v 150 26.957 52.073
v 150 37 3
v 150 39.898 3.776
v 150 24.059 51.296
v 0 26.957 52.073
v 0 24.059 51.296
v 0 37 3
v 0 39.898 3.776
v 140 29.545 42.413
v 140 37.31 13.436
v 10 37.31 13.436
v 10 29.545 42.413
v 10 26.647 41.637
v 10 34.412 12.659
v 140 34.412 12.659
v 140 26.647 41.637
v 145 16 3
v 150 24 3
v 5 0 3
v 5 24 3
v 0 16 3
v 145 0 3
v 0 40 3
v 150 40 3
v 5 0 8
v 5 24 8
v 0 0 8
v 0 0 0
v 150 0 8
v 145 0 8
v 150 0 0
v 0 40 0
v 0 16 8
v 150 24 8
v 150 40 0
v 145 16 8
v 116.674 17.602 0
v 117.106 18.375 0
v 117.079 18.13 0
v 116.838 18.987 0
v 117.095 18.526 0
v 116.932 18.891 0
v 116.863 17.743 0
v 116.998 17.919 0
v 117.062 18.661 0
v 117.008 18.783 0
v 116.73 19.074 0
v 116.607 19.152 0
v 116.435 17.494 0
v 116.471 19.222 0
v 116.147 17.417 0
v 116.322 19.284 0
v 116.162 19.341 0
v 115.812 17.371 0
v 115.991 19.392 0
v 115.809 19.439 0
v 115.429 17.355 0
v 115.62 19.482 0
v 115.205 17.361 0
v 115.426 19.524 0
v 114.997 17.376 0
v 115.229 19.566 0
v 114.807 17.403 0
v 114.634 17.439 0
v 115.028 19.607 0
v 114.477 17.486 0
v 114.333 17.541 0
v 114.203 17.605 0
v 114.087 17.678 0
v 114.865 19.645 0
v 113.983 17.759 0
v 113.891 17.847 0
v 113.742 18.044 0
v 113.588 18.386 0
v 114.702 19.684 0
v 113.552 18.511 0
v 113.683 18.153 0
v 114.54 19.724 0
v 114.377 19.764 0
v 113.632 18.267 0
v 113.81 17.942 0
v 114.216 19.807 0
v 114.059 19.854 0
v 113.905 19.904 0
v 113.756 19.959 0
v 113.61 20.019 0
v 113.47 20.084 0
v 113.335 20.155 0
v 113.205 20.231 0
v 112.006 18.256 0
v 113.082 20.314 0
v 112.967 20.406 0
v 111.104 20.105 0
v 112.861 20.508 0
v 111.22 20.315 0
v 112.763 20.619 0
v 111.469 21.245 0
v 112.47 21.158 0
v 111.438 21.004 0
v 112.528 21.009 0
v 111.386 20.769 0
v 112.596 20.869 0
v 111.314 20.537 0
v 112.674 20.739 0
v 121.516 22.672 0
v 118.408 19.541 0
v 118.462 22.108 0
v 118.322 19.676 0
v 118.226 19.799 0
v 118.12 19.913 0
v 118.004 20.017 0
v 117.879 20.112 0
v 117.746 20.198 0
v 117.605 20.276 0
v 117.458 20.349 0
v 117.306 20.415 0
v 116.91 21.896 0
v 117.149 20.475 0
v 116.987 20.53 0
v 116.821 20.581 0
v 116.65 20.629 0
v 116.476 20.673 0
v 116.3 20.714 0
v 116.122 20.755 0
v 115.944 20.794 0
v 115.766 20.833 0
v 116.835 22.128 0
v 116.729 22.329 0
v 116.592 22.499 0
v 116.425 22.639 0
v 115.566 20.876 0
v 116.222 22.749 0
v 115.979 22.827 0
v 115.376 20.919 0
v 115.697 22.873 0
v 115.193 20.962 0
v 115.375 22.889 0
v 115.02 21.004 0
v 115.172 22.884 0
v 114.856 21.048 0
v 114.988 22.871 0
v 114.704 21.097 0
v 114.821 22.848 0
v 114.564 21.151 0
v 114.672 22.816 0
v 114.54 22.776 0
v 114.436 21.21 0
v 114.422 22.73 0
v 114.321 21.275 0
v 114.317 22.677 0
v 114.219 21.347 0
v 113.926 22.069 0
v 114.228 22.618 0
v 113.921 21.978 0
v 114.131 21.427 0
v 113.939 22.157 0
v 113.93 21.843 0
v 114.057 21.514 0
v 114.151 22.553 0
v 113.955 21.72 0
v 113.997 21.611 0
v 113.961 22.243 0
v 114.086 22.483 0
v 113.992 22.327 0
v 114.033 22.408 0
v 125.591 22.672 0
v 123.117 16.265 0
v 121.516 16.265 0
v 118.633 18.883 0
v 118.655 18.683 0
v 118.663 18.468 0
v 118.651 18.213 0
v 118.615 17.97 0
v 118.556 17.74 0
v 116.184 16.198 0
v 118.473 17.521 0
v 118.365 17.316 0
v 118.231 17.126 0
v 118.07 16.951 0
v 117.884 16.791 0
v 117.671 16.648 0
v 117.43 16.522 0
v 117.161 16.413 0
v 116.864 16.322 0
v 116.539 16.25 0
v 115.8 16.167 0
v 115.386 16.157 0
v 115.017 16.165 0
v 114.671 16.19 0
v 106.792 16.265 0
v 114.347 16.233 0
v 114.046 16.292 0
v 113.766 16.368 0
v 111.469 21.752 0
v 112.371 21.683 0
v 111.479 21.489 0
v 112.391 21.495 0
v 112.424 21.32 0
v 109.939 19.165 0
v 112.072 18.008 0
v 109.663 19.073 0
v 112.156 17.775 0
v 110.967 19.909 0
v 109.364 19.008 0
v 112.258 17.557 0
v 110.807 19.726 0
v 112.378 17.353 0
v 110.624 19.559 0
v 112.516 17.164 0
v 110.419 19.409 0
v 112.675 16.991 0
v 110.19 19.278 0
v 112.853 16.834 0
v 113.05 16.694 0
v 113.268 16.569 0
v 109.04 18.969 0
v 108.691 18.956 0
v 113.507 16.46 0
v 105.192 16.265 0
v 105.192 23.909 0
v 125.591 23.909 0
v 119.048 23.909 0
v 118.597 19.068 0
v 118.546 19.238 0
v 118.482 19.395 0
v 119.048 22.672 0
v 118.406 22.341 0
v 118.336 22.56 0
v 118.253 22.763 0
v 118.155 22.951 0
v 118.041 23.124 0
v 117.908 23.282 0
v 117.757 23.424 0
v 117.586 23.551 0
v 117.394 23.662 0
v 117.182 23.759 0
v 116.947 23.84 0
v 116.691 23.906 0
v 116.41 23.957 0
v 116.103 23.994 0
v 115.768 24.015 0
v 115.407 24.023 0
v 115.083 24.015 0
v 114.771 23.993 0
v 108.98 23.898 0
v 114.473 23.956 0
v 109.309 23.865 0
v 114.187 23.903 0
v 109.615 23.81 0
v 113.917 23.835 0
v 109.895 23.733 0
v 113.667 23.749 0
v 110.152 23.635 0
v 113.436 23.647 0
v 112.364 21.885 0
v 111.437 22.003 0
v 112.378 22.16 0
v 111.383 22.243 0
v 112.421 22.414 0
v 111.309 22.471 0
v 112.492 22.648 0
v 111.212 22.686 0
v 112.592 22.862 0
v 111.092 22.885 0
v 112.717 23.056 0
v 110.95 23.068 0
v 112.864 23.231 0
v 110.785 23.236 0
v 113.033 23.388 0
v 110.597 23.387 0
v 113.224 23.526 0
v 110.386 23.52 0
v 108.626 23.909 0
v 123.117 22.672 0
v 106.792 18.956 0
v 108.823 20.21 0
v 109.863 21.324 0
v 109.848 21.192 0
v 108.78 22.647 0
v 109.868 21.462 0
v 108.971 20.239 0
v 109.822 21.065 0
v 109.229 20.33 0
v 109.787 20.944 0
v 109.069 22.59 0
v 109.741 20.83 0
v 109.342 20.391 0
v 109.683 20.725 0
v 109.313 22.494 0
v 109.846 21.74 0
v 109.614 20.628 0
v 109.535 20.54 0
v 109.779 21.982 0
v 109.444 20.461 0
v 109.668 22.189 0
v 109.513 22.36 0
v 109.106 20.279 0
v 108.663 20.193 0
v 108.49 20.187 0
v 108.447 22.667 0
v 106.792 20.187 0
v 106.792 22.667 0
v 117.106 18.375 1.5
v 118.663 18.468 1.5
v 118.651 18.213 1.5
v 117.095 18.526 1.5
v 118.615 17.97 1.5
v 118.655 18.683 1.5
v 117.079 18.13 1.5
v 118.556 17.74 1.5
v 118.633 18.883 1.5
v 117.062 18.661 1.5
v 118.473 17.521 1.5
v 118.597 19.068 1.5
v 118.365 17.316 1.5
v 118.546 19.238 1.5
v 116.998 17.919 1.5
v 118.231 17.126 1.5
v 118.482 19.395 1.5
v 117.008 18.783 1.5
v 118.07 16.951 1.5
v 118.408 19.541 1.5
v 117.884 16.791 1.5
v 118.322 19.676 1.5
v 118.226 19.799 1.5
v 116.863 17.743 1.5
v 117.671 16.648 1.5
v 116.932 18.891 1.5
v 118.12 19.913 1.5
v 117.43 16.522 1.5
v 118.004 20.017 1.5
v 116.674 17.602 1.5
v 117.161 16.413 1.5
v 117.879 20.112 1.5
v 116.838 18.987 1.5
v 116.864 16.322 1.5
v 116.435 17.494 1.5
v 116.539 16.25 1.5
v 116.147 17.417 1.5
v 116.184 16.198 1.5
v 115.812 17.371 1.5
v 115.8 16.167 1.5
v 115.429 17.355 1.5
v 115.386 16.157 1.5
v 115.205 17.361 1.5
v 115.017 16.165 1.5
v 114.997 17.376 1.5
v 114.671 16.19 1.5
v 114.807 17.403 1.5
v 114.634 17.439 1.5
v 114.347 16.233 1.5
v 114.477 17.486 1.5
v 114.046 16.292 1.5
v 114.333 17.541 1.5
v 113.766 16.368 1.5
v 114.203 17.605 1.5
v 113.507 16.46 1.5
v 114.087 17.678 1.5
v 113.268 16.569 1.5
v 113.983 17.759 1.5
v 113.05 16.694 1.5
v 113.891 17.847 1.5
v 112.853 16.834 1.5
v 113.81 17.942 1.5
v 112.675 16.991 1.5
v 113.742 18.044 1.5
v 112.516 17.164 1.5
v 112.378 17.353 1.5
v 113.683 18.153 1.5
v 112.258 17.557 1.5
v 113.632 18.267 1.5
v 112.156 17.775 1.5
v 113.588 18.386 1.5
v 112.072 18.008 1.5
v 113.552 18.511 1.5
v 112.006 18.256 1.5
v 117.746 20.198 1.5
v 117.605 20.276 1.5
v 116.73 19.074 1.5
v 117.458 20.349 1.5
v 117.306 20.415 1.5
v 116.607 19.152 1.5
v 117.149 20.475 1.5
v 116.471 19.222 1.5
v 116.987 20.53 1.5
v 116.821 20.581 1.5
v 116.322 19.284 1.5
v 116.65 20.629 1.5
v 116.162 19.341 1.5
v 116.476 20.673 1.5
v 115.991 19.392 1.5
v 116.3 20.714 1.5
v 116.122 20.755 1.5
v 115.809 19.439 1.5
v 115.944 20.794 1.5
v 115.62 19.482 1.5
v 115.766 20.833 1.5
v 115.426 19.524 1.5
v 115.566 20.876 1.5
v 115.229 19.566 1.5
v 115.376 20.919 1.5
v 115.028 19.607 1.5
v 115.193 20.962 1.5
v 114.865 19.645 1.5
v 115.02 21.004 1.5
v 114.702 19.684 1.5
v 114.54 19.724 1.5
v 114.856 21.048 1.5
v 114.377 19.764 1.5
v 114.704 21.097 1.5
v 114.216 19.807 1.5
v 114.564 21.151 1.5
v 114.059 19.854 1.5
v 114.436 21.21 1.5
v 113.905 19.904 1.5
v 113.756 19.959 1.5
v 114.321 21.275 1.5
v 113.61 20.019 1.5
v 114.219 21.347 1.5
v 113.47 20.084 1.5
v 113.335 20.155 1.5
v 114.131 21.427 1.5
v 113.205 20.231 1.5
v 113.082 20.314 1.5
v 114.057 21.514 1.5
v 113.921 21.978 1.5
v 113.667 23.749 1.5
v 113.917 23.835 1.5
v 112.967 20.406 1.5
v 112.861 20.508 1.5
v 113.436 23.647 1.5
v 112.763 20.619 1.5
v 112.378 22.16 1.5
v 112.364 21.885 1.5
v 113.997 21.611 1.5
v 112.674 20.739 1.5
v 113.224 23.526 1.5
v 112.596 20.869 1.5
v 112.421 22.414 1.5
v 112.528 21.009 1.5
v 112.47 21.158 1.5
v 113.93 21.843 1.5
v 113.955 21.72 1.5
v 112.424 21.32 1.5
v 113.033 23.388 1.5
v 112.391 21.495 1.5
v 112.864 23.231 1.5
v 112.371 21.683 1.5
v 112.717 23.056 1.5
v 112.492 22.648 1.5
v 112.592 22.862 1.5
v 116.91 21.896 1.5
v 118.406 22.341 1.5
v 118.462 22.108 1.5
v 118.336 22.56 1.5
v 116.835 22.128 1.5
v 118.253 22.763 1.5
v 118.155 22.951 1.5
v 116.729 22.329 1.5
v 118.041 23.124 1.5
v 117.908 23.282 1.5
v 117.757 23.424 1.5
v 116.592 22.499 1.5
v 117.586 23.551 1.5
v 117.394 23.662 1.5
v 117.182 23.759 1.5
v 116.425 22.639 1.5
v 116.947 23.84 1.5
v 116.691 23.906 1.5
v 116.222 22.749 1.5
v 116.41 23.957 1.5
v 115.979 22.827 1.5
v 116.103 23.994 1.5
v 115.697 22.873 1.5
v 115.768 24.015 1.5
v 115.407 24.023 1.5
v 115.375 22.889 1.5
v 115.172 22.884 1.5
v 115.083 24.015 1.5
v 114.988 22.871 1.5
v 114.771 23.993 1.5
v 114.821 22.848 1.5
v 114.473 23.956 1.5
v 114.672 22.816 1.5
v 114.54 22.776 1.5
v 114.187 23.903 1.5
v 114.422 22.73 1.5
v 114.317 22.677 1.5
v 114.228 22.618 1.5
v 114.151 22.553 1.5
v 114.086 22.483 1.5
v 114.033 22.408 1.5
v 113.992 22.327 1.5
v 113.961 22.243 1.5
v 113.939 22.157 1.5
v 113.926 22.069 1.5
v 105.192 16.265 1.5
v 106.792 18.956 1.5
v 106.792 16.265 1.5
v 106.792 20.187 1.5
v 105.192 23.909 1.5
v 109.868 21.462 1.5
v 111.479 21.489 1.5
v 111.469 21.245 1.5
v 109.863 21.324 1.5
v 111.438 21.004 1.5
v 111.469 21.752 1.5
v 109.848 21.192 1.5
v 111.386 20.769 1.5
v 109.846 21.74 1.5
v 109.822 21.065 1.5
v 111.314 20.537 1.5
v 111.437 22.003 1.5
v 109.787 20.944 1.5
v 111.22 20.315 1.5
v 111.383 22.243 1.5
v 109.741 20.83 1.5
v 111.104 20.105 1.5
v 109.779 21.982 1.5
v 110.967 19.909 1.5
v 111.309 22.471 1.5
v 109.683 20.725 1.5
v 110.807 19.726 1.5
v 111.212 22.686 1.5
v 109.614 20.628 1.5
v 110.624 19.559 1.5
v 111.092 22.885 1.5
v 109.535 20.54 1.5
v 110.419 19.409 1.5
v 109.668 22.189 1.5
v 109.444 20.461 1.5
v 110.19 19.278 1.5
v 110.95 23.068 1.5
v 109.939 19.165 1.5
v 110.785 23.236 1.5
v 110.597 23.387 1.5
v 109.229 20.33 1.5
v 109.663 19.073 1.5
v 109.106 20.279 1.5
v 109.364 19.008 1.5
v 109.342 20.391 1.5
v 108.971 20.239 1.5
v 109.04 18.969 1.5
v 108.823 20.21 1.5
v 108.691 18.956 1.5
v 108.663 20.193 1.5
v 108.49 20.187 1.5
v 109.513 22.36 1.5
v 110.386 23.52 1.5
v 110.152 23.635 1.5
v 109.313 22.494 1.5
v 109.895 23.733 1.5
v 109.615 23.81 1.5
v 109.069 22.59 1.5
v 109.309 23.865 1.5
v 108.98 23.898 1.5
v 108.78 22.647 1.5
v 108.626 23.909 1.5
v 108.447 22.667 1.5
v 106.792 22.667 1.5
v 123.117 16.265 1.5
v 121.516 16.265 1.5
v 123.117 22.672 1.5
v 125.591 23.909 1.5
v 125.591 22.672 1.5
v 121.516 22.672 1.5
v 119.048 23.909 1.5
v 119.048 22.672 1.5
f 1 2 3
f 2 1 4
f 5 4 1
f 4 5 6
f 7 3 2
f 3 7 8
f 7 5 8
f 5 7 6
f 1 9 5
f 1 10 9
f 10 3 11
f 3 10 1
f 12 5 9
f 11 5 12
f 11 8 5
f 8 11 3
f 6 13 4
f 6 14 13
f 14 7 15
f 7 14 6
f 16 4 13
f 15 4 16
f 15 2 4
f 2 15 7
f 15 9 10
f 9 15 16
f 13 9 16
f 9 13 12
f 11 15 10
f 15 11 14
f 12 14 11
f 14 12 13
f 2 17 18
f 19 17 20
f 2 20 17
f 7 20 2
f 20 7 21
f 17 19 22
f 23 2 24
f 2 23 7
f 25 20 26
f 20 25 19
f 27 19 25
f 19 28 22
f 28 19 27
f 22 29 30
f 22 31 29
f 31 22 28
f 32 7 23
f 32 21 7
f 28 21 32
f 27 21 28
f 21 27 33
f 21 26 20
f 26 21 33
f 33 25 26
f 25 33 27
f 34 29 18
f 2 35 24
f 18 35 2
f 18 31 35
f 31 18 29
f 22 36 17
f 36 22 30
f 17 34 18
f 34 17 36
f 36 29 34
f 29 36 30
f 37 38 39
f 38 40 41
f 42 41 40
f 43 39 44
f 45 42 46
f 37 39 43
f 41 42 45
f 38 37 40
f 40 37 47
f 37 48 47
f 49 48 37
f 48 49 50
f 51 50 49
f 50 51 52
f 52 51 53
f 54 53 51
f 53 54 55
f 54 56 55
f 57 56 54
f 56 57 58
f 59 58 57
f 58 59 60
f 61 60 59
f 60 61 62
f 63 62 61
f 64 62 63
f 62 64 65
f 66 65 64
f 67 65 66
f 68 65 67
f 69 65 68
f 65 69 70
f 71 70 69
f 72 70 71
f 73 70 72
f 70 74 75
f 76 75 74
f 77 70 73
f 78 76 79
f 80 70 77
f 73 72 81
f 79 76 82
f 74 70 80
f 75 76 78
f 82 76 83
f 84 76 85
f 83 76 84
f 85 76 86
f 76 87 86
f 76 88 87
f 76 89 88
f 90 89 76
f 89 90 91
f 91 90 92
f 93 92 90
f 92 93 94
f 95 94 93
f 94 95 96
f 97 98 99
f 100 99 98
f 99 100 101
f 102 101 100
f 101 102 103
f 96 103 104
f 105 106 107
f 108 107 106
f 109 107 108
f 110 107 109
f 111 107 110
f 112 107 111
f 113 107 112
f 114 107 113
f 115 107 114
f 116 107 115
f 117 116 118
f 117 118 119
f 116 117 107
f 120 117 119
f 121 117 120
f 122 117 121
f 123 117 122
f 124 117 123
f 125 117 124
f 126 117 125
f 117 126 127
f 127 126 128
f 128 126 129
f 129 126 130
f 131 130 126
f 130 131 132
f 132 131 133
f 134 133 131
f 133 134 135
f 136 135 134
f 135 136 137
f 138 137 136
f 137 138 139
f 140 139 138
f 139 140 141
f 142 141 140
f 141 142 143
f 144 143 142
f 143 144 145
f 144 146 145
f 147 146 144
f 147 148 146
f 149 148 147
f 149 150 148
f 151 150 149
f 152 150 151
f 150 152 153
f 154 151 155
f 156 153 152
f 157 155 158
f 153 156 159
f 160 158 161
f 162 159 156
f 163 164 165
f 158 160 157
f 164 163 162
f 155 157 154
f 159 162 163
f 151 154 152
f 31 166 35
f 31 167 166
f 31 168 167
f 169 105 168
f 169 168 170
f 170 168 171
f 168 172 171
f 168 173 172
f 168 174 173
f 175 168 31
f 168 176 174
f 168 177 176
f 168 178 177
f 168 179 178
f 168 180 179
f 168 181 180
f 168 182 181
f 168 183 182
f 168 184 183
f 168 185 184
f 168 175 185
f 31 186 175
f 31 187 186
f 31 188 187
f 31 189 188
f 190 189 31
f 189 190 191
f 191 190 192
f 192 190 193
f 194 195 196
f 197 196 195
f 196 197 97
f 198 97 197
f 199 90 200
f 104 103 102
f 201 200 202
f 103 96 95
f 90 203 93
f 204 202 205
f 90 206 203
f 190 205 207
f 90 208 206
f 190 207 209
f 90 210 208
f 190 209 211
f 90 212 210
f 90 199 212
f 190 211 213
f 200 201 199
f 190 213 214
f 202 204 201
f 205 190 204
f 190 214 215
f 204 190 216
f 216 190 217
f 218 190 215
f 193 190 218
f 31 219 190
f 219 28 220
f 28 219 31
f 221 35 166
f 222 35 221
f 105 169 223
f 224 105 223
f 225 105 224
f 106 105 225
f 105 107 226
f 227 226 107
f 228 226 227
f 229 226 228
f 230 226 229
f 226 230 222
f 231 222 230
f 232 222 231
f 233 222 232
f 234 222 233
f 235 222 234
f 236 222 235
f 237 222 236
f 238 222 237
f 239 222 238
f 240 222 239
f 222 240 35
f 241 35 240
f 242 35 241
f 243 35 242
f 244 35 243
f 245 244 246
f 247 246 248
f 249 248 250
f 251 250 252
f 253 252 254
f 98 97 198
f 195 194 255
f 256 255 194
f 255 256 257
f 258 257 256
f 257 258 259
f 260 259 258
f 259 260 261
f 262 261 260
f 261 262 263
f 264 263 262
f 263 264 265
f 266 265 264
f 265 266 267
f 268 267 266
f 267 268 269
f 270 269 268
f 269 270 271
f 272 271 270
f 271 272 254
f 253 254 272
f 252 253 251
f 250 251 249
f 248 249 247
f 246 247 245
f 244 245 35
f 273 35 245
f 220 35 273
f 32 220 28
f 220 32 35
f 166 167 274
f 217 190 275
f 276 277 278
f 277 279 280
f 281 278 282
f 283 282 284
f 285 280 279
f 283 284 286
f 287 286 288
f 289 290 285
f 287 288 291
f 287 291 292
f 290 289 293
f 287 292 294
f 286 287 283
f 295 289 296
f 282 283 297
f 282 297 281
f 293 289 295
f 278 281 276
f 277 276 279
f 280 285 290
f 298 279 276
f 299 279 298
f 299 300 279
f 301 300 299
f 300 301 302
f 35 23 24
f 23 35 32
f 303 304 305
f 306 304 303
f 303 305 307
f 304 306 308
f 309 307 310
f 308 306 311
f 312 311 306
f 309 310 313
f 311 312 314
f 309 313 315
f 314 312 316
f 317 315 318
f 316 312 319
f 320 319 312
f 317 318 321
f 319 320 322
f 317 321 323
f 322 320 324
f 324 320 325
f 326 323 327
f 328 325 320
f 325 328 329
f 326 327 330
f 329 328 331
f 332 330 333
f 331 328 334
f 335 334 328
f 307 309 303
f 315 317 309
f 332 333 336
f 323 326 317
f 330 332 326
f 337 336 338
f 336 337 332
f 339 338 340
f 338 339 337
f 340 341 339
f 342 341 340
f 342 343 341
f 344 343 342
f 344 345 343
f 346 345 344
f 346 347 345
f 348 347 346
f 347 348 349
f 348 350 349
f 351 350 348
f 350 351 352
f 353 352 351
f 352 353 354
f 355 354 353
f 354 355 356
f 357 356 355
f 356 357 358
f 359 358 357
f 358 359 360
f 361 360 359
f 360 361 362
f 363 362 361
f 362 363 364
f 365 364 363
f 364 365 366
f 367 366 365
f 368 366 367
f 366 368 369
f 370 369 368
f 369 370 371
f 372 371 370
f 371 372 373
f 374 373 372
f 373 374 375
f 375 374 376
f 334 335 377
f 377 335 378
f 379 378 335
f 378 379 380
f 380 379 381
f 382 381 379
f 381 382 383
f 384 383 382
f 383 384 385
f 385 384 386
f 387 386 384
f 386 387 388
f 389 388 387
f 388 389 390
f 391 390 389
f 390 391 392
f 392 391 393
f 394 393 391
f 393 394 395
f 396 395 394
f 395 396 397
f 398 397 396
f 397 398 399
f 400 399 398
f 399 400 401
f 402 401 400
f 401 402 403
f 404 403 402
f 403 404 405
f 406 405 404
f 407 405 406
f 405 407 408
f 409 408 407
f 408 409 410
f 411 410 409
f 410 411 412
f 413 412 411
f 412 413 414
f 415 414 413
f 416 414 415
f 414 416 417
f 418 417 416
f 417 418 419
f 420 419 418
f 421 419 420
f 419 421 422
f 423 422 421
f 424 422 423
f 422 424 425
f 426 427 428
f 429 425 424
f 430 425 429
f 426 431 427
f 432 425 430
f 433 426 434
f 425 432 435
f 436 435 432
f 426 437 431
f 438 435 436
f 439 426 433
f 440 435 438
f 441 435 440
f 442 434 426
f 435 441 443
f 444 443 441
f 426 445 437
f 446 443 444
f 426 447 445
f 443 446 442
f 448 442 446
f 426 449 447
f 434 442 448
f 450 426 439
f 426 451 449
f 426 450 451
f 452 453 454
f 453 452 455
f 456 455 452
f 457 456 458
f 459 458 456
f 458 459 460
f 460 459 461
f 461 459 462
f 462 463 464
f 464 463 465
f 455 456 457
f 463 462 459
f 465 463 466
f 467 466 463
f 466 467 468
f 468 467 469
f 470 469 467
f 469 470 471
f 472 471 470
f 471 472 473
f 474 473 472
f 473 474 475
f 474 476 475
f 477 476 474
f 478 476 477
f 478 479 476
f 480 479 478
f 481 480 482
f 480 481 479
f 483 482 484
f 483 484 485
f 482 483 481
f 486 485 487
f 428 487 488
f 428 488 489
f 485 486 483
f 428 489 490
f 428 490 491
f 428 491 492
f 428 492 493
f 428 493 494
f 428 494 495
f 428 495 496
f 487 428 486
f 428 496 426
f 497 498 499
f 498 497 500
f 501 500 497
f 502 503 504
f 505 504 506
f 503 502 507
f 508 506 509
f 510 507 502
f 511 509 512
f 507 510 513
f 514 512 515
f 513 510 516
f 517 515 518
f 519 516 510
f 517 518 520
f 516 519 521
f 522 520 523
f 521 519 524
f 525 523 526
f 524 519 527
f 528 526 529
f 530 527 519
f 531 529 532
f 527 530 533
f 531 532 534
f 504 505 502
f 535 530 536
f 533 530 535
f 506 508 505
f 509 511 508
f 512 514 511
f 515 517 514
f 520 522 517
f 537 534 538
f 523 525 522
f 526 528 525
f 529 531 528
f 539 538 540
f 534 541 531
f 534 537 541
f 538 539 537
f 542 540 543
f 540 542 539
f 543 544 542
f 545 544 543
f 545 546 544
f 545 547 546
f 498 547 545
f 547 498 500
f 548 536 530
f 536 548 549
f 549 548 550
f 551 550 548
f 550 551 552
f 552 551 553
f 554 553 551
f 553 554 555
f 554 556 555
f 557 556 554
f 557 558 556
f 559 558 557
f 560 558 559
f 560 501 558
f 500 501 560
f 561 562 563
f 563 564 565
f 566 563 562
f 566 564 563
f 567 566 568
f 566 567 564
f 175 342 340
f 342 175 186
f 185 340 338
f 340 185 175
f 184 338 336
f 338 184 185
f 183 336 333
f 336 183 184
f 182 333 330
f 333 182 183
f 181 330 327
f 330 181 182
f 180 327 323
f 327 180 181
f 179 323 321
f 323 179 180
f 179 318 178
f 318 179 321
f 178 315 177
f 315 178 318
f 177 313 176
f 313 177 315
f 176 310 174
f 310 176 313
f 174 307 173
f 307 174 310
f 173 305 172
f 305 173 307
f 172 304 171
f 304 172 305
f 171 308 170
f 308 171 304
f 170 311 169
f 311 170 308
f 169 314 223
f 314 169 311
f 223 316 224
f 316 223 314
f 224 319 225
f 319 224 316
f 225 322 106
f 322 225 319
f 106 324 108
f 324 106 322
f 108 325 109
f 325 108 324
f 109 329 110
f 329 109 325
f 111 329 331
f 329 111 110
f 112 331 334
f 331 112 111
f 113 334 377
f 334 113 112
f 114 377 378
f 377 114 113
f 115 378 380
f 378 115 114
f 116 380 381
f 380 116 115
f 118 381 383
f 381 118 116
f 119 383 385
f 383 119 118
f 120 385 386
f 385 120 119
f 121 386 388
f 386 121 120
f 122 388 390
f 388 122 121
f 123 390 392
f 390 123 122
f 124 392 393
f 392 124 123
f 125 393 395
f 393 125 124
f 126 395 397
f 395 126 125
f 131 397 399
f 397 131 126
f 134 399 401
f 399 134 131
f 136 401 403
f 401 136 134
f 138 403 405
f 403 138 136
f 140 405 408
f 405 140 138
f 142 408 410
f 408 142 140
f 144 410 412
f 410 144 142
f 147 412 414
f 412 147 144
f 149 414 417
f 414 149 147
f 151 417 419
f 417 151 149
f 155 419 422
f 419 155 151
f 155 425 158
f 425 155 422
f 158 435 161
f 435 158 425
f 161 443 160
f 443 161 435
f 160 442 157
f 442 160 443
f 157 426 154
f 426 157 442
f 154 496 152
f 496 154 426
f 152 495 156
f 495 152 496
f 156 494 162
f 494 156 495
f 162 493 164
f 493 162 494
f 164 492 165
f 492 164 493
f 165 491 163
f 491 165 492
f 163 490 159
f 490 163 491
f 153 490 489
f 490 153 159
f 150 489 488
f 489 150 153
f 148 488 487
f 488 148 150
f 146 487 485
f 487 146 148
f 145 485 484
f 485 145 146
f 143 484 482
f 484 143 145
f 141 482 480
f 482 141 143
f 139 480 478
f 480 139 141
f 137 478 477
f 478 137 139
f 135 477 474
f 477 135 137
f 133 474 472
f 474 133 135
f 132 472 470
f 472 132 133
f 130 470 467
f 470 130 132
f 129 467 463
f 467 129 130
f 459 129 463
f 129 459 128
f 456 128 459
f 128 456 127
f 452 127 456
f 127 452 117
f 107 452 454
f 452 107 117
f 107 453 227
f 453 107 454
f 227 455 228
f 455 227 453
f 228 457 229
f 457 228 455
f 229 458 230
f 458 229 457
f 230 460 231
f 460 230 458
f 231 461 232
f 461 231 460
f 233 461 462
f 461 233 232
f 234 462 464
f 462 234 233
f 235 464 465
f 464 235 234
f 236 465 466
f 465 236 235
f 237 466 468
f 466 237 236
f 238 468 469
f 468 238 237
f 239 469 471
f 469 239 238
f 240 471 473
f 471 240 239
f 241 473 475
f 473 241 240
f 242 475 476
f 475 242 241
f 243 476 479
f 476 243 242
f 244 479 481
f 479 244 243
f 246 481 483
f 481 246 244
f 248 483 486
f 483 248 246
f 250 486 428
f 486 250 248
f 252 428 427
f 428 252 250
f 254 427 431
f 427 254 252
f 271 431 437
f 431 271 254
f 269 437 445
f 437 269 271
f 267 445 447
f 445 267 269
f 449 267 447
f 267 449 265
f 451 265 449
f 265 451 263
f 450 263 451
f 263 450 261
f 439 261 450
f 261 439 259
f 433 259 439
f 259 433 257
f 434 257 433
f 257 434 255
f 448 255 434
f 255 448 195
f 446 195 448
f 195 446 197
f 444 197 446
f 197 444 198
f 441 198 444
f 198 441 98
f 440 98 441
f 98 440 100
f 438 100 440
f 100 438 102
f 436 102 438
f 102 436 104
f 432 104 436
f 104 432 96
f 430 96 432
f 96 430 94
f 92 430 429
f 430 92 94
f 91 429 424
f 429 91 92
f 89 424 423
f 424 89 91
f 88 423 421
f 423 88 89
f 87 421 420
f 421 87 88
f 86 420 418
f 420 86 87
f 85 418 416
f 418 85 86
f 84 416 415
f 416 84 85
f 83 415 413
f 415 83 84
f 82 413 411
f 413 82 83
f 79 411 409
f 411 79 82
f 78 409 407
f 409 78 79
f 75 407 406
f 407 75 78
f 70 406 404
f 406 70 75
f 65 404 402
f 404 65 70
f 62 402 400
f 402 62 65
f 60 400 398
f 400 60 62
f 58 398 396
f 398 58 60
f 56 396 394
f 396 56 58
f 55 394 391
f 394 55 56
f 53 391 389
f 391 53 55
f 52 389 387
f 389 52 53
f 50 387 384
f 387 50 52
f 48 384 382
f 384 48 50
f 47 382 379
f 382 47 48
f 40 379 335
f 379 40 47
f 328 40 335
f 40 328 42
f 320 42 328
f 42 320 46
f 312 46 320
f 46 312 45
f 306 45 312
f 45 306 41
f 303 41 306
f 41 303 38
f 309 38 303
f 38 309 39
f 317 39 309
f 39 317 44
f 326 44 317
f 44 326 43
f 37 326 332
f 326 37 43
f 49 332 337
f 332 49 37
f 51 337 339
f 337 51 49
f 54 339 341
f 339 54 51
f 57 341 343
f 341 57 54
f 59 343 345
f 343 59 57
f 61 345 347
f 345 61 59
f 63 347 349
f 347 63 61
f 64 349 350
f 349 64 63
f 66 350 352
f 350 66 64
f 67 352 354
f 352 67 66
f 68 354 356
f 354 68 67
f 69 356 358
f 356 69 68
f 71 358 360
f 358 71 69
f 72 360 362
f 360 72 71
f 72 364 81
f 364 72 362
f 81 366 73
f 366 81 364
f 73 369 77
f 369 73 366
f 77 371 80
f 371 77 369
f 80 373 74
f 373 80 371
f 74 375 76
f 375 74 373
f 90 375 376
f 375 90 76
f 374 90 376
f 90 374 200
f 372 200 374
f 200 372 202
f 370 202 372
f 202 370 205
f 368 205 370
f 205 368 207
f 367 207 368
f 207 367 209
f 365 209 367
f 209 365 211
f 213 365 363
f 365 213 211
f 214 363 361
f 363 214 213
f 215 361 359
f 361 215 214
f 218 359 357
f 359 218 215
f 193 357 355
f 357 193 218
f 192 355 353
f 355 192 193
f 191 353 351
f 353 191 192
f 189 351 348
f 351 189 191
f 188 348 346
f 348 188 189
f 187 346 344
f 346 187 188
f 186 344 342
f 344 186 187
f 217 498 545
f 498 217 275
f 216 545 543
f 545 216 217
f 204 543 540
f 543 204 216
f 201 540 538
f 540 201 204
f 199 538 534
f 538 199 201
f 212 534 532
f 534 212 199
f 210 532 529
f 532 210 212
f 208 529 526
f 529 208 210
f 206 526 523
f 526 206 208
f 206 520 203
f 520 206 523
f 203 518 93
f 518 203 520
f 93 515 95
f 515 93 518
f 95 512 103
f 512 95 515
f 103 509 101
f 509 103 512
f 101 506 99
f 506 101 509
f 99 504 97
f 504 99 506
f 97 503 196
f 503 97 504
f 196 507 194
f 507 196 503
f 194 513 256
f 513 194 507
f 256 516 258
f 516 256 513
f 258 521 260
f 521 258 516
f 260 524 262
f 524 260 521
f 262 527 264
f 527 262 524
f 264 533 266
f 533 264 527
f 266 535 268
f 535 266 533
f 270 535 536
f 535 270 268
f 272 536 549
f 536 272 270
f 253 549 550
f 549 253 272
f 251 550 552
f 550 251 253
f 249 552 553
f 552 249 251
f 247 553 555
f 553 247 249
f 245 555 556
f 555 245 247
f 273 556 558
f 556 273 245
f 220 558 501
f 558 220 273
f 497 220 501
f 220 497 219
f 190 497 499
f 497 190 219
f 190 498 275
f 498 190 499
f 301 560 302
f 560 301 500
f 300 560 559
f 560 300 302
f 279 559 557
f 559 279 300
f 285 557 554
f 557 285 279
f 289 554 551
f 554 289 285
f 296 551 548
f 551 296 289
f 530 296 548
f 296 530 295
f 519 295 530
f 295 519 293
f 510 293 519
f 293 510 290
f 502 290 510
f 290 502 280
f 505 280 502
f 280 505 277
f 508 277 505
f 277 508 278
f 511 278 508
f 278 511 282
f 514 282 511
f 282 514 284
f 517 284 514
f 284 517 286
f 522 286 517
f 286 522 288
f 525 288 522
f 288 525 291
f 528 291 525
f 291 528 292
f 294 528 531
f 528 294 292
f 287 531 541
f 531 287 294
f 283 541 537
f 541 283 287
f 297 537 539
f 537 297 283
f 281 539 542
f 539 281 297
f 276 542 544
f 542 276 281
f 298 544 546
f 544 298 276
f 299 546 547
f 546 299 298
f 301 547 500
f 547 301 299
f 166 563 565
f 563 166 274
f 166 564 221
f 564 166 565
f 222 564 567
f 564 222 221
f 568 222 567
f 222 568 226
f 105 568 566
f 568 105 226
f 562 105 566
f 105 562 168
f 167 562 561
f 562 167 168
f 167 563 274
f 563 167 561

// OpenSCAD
// Desk Nameplate Holder
// For team member names or project identification

// Parameters
nameplate_length = 150;
nameplate_width = 40;
base_thickness = 3;
back_height = 50;
back_thickness = 3;
angle = 15; // Tilt angle for better visibility
slot_depth = 2;
slot_height = 30;

// Main nameplate holder
module desk_nameplate() {
    difference() {
        union() {
            // Base
            cube([nameplate_length, nameplate_width, base_thickness]);
            
            // Angled back support
            translate([0, nameplate_width - back_thickness, base_thickness]) {
                rotate([angle, 0, 0]) {
                    difference() {
                        cube([nameplate_length, back_thickness, back_height]);
                        
                        // Card slot
                        translate([10, -1, (back_height - slot_height) / 2]) {
                            cube([nameplate_length - 20, 
                                  slot_depth + 2, 
                                  slot_height]);
                        }
                    }
                }
            }
            
            // Side supports
            for (x = [0, nameplate_length - 5]) {
                translate([x, 0, base_thickness]) {
                    linear_extrude(height = 5) {
                        polygon([[0, 0], 
                                [5, 0], 
                                [5, nameplate_width * 0.6], 
                                [0, nameplate_width * 0.4]]);
                    }
                }
            }
        }
        
        // Optional logo area (debossed)
        translate([nameplate_length - 35, nameplate_width / 2, 0]) {
            linear_extrude(height = 1.5) {
                text("PST", size = 8, halign = "center", valign = "center", 
                     font = "Liberation Sans:style=Bold");
            }
        }
    }
}

// Render the nameplate
desk_nameplate();
